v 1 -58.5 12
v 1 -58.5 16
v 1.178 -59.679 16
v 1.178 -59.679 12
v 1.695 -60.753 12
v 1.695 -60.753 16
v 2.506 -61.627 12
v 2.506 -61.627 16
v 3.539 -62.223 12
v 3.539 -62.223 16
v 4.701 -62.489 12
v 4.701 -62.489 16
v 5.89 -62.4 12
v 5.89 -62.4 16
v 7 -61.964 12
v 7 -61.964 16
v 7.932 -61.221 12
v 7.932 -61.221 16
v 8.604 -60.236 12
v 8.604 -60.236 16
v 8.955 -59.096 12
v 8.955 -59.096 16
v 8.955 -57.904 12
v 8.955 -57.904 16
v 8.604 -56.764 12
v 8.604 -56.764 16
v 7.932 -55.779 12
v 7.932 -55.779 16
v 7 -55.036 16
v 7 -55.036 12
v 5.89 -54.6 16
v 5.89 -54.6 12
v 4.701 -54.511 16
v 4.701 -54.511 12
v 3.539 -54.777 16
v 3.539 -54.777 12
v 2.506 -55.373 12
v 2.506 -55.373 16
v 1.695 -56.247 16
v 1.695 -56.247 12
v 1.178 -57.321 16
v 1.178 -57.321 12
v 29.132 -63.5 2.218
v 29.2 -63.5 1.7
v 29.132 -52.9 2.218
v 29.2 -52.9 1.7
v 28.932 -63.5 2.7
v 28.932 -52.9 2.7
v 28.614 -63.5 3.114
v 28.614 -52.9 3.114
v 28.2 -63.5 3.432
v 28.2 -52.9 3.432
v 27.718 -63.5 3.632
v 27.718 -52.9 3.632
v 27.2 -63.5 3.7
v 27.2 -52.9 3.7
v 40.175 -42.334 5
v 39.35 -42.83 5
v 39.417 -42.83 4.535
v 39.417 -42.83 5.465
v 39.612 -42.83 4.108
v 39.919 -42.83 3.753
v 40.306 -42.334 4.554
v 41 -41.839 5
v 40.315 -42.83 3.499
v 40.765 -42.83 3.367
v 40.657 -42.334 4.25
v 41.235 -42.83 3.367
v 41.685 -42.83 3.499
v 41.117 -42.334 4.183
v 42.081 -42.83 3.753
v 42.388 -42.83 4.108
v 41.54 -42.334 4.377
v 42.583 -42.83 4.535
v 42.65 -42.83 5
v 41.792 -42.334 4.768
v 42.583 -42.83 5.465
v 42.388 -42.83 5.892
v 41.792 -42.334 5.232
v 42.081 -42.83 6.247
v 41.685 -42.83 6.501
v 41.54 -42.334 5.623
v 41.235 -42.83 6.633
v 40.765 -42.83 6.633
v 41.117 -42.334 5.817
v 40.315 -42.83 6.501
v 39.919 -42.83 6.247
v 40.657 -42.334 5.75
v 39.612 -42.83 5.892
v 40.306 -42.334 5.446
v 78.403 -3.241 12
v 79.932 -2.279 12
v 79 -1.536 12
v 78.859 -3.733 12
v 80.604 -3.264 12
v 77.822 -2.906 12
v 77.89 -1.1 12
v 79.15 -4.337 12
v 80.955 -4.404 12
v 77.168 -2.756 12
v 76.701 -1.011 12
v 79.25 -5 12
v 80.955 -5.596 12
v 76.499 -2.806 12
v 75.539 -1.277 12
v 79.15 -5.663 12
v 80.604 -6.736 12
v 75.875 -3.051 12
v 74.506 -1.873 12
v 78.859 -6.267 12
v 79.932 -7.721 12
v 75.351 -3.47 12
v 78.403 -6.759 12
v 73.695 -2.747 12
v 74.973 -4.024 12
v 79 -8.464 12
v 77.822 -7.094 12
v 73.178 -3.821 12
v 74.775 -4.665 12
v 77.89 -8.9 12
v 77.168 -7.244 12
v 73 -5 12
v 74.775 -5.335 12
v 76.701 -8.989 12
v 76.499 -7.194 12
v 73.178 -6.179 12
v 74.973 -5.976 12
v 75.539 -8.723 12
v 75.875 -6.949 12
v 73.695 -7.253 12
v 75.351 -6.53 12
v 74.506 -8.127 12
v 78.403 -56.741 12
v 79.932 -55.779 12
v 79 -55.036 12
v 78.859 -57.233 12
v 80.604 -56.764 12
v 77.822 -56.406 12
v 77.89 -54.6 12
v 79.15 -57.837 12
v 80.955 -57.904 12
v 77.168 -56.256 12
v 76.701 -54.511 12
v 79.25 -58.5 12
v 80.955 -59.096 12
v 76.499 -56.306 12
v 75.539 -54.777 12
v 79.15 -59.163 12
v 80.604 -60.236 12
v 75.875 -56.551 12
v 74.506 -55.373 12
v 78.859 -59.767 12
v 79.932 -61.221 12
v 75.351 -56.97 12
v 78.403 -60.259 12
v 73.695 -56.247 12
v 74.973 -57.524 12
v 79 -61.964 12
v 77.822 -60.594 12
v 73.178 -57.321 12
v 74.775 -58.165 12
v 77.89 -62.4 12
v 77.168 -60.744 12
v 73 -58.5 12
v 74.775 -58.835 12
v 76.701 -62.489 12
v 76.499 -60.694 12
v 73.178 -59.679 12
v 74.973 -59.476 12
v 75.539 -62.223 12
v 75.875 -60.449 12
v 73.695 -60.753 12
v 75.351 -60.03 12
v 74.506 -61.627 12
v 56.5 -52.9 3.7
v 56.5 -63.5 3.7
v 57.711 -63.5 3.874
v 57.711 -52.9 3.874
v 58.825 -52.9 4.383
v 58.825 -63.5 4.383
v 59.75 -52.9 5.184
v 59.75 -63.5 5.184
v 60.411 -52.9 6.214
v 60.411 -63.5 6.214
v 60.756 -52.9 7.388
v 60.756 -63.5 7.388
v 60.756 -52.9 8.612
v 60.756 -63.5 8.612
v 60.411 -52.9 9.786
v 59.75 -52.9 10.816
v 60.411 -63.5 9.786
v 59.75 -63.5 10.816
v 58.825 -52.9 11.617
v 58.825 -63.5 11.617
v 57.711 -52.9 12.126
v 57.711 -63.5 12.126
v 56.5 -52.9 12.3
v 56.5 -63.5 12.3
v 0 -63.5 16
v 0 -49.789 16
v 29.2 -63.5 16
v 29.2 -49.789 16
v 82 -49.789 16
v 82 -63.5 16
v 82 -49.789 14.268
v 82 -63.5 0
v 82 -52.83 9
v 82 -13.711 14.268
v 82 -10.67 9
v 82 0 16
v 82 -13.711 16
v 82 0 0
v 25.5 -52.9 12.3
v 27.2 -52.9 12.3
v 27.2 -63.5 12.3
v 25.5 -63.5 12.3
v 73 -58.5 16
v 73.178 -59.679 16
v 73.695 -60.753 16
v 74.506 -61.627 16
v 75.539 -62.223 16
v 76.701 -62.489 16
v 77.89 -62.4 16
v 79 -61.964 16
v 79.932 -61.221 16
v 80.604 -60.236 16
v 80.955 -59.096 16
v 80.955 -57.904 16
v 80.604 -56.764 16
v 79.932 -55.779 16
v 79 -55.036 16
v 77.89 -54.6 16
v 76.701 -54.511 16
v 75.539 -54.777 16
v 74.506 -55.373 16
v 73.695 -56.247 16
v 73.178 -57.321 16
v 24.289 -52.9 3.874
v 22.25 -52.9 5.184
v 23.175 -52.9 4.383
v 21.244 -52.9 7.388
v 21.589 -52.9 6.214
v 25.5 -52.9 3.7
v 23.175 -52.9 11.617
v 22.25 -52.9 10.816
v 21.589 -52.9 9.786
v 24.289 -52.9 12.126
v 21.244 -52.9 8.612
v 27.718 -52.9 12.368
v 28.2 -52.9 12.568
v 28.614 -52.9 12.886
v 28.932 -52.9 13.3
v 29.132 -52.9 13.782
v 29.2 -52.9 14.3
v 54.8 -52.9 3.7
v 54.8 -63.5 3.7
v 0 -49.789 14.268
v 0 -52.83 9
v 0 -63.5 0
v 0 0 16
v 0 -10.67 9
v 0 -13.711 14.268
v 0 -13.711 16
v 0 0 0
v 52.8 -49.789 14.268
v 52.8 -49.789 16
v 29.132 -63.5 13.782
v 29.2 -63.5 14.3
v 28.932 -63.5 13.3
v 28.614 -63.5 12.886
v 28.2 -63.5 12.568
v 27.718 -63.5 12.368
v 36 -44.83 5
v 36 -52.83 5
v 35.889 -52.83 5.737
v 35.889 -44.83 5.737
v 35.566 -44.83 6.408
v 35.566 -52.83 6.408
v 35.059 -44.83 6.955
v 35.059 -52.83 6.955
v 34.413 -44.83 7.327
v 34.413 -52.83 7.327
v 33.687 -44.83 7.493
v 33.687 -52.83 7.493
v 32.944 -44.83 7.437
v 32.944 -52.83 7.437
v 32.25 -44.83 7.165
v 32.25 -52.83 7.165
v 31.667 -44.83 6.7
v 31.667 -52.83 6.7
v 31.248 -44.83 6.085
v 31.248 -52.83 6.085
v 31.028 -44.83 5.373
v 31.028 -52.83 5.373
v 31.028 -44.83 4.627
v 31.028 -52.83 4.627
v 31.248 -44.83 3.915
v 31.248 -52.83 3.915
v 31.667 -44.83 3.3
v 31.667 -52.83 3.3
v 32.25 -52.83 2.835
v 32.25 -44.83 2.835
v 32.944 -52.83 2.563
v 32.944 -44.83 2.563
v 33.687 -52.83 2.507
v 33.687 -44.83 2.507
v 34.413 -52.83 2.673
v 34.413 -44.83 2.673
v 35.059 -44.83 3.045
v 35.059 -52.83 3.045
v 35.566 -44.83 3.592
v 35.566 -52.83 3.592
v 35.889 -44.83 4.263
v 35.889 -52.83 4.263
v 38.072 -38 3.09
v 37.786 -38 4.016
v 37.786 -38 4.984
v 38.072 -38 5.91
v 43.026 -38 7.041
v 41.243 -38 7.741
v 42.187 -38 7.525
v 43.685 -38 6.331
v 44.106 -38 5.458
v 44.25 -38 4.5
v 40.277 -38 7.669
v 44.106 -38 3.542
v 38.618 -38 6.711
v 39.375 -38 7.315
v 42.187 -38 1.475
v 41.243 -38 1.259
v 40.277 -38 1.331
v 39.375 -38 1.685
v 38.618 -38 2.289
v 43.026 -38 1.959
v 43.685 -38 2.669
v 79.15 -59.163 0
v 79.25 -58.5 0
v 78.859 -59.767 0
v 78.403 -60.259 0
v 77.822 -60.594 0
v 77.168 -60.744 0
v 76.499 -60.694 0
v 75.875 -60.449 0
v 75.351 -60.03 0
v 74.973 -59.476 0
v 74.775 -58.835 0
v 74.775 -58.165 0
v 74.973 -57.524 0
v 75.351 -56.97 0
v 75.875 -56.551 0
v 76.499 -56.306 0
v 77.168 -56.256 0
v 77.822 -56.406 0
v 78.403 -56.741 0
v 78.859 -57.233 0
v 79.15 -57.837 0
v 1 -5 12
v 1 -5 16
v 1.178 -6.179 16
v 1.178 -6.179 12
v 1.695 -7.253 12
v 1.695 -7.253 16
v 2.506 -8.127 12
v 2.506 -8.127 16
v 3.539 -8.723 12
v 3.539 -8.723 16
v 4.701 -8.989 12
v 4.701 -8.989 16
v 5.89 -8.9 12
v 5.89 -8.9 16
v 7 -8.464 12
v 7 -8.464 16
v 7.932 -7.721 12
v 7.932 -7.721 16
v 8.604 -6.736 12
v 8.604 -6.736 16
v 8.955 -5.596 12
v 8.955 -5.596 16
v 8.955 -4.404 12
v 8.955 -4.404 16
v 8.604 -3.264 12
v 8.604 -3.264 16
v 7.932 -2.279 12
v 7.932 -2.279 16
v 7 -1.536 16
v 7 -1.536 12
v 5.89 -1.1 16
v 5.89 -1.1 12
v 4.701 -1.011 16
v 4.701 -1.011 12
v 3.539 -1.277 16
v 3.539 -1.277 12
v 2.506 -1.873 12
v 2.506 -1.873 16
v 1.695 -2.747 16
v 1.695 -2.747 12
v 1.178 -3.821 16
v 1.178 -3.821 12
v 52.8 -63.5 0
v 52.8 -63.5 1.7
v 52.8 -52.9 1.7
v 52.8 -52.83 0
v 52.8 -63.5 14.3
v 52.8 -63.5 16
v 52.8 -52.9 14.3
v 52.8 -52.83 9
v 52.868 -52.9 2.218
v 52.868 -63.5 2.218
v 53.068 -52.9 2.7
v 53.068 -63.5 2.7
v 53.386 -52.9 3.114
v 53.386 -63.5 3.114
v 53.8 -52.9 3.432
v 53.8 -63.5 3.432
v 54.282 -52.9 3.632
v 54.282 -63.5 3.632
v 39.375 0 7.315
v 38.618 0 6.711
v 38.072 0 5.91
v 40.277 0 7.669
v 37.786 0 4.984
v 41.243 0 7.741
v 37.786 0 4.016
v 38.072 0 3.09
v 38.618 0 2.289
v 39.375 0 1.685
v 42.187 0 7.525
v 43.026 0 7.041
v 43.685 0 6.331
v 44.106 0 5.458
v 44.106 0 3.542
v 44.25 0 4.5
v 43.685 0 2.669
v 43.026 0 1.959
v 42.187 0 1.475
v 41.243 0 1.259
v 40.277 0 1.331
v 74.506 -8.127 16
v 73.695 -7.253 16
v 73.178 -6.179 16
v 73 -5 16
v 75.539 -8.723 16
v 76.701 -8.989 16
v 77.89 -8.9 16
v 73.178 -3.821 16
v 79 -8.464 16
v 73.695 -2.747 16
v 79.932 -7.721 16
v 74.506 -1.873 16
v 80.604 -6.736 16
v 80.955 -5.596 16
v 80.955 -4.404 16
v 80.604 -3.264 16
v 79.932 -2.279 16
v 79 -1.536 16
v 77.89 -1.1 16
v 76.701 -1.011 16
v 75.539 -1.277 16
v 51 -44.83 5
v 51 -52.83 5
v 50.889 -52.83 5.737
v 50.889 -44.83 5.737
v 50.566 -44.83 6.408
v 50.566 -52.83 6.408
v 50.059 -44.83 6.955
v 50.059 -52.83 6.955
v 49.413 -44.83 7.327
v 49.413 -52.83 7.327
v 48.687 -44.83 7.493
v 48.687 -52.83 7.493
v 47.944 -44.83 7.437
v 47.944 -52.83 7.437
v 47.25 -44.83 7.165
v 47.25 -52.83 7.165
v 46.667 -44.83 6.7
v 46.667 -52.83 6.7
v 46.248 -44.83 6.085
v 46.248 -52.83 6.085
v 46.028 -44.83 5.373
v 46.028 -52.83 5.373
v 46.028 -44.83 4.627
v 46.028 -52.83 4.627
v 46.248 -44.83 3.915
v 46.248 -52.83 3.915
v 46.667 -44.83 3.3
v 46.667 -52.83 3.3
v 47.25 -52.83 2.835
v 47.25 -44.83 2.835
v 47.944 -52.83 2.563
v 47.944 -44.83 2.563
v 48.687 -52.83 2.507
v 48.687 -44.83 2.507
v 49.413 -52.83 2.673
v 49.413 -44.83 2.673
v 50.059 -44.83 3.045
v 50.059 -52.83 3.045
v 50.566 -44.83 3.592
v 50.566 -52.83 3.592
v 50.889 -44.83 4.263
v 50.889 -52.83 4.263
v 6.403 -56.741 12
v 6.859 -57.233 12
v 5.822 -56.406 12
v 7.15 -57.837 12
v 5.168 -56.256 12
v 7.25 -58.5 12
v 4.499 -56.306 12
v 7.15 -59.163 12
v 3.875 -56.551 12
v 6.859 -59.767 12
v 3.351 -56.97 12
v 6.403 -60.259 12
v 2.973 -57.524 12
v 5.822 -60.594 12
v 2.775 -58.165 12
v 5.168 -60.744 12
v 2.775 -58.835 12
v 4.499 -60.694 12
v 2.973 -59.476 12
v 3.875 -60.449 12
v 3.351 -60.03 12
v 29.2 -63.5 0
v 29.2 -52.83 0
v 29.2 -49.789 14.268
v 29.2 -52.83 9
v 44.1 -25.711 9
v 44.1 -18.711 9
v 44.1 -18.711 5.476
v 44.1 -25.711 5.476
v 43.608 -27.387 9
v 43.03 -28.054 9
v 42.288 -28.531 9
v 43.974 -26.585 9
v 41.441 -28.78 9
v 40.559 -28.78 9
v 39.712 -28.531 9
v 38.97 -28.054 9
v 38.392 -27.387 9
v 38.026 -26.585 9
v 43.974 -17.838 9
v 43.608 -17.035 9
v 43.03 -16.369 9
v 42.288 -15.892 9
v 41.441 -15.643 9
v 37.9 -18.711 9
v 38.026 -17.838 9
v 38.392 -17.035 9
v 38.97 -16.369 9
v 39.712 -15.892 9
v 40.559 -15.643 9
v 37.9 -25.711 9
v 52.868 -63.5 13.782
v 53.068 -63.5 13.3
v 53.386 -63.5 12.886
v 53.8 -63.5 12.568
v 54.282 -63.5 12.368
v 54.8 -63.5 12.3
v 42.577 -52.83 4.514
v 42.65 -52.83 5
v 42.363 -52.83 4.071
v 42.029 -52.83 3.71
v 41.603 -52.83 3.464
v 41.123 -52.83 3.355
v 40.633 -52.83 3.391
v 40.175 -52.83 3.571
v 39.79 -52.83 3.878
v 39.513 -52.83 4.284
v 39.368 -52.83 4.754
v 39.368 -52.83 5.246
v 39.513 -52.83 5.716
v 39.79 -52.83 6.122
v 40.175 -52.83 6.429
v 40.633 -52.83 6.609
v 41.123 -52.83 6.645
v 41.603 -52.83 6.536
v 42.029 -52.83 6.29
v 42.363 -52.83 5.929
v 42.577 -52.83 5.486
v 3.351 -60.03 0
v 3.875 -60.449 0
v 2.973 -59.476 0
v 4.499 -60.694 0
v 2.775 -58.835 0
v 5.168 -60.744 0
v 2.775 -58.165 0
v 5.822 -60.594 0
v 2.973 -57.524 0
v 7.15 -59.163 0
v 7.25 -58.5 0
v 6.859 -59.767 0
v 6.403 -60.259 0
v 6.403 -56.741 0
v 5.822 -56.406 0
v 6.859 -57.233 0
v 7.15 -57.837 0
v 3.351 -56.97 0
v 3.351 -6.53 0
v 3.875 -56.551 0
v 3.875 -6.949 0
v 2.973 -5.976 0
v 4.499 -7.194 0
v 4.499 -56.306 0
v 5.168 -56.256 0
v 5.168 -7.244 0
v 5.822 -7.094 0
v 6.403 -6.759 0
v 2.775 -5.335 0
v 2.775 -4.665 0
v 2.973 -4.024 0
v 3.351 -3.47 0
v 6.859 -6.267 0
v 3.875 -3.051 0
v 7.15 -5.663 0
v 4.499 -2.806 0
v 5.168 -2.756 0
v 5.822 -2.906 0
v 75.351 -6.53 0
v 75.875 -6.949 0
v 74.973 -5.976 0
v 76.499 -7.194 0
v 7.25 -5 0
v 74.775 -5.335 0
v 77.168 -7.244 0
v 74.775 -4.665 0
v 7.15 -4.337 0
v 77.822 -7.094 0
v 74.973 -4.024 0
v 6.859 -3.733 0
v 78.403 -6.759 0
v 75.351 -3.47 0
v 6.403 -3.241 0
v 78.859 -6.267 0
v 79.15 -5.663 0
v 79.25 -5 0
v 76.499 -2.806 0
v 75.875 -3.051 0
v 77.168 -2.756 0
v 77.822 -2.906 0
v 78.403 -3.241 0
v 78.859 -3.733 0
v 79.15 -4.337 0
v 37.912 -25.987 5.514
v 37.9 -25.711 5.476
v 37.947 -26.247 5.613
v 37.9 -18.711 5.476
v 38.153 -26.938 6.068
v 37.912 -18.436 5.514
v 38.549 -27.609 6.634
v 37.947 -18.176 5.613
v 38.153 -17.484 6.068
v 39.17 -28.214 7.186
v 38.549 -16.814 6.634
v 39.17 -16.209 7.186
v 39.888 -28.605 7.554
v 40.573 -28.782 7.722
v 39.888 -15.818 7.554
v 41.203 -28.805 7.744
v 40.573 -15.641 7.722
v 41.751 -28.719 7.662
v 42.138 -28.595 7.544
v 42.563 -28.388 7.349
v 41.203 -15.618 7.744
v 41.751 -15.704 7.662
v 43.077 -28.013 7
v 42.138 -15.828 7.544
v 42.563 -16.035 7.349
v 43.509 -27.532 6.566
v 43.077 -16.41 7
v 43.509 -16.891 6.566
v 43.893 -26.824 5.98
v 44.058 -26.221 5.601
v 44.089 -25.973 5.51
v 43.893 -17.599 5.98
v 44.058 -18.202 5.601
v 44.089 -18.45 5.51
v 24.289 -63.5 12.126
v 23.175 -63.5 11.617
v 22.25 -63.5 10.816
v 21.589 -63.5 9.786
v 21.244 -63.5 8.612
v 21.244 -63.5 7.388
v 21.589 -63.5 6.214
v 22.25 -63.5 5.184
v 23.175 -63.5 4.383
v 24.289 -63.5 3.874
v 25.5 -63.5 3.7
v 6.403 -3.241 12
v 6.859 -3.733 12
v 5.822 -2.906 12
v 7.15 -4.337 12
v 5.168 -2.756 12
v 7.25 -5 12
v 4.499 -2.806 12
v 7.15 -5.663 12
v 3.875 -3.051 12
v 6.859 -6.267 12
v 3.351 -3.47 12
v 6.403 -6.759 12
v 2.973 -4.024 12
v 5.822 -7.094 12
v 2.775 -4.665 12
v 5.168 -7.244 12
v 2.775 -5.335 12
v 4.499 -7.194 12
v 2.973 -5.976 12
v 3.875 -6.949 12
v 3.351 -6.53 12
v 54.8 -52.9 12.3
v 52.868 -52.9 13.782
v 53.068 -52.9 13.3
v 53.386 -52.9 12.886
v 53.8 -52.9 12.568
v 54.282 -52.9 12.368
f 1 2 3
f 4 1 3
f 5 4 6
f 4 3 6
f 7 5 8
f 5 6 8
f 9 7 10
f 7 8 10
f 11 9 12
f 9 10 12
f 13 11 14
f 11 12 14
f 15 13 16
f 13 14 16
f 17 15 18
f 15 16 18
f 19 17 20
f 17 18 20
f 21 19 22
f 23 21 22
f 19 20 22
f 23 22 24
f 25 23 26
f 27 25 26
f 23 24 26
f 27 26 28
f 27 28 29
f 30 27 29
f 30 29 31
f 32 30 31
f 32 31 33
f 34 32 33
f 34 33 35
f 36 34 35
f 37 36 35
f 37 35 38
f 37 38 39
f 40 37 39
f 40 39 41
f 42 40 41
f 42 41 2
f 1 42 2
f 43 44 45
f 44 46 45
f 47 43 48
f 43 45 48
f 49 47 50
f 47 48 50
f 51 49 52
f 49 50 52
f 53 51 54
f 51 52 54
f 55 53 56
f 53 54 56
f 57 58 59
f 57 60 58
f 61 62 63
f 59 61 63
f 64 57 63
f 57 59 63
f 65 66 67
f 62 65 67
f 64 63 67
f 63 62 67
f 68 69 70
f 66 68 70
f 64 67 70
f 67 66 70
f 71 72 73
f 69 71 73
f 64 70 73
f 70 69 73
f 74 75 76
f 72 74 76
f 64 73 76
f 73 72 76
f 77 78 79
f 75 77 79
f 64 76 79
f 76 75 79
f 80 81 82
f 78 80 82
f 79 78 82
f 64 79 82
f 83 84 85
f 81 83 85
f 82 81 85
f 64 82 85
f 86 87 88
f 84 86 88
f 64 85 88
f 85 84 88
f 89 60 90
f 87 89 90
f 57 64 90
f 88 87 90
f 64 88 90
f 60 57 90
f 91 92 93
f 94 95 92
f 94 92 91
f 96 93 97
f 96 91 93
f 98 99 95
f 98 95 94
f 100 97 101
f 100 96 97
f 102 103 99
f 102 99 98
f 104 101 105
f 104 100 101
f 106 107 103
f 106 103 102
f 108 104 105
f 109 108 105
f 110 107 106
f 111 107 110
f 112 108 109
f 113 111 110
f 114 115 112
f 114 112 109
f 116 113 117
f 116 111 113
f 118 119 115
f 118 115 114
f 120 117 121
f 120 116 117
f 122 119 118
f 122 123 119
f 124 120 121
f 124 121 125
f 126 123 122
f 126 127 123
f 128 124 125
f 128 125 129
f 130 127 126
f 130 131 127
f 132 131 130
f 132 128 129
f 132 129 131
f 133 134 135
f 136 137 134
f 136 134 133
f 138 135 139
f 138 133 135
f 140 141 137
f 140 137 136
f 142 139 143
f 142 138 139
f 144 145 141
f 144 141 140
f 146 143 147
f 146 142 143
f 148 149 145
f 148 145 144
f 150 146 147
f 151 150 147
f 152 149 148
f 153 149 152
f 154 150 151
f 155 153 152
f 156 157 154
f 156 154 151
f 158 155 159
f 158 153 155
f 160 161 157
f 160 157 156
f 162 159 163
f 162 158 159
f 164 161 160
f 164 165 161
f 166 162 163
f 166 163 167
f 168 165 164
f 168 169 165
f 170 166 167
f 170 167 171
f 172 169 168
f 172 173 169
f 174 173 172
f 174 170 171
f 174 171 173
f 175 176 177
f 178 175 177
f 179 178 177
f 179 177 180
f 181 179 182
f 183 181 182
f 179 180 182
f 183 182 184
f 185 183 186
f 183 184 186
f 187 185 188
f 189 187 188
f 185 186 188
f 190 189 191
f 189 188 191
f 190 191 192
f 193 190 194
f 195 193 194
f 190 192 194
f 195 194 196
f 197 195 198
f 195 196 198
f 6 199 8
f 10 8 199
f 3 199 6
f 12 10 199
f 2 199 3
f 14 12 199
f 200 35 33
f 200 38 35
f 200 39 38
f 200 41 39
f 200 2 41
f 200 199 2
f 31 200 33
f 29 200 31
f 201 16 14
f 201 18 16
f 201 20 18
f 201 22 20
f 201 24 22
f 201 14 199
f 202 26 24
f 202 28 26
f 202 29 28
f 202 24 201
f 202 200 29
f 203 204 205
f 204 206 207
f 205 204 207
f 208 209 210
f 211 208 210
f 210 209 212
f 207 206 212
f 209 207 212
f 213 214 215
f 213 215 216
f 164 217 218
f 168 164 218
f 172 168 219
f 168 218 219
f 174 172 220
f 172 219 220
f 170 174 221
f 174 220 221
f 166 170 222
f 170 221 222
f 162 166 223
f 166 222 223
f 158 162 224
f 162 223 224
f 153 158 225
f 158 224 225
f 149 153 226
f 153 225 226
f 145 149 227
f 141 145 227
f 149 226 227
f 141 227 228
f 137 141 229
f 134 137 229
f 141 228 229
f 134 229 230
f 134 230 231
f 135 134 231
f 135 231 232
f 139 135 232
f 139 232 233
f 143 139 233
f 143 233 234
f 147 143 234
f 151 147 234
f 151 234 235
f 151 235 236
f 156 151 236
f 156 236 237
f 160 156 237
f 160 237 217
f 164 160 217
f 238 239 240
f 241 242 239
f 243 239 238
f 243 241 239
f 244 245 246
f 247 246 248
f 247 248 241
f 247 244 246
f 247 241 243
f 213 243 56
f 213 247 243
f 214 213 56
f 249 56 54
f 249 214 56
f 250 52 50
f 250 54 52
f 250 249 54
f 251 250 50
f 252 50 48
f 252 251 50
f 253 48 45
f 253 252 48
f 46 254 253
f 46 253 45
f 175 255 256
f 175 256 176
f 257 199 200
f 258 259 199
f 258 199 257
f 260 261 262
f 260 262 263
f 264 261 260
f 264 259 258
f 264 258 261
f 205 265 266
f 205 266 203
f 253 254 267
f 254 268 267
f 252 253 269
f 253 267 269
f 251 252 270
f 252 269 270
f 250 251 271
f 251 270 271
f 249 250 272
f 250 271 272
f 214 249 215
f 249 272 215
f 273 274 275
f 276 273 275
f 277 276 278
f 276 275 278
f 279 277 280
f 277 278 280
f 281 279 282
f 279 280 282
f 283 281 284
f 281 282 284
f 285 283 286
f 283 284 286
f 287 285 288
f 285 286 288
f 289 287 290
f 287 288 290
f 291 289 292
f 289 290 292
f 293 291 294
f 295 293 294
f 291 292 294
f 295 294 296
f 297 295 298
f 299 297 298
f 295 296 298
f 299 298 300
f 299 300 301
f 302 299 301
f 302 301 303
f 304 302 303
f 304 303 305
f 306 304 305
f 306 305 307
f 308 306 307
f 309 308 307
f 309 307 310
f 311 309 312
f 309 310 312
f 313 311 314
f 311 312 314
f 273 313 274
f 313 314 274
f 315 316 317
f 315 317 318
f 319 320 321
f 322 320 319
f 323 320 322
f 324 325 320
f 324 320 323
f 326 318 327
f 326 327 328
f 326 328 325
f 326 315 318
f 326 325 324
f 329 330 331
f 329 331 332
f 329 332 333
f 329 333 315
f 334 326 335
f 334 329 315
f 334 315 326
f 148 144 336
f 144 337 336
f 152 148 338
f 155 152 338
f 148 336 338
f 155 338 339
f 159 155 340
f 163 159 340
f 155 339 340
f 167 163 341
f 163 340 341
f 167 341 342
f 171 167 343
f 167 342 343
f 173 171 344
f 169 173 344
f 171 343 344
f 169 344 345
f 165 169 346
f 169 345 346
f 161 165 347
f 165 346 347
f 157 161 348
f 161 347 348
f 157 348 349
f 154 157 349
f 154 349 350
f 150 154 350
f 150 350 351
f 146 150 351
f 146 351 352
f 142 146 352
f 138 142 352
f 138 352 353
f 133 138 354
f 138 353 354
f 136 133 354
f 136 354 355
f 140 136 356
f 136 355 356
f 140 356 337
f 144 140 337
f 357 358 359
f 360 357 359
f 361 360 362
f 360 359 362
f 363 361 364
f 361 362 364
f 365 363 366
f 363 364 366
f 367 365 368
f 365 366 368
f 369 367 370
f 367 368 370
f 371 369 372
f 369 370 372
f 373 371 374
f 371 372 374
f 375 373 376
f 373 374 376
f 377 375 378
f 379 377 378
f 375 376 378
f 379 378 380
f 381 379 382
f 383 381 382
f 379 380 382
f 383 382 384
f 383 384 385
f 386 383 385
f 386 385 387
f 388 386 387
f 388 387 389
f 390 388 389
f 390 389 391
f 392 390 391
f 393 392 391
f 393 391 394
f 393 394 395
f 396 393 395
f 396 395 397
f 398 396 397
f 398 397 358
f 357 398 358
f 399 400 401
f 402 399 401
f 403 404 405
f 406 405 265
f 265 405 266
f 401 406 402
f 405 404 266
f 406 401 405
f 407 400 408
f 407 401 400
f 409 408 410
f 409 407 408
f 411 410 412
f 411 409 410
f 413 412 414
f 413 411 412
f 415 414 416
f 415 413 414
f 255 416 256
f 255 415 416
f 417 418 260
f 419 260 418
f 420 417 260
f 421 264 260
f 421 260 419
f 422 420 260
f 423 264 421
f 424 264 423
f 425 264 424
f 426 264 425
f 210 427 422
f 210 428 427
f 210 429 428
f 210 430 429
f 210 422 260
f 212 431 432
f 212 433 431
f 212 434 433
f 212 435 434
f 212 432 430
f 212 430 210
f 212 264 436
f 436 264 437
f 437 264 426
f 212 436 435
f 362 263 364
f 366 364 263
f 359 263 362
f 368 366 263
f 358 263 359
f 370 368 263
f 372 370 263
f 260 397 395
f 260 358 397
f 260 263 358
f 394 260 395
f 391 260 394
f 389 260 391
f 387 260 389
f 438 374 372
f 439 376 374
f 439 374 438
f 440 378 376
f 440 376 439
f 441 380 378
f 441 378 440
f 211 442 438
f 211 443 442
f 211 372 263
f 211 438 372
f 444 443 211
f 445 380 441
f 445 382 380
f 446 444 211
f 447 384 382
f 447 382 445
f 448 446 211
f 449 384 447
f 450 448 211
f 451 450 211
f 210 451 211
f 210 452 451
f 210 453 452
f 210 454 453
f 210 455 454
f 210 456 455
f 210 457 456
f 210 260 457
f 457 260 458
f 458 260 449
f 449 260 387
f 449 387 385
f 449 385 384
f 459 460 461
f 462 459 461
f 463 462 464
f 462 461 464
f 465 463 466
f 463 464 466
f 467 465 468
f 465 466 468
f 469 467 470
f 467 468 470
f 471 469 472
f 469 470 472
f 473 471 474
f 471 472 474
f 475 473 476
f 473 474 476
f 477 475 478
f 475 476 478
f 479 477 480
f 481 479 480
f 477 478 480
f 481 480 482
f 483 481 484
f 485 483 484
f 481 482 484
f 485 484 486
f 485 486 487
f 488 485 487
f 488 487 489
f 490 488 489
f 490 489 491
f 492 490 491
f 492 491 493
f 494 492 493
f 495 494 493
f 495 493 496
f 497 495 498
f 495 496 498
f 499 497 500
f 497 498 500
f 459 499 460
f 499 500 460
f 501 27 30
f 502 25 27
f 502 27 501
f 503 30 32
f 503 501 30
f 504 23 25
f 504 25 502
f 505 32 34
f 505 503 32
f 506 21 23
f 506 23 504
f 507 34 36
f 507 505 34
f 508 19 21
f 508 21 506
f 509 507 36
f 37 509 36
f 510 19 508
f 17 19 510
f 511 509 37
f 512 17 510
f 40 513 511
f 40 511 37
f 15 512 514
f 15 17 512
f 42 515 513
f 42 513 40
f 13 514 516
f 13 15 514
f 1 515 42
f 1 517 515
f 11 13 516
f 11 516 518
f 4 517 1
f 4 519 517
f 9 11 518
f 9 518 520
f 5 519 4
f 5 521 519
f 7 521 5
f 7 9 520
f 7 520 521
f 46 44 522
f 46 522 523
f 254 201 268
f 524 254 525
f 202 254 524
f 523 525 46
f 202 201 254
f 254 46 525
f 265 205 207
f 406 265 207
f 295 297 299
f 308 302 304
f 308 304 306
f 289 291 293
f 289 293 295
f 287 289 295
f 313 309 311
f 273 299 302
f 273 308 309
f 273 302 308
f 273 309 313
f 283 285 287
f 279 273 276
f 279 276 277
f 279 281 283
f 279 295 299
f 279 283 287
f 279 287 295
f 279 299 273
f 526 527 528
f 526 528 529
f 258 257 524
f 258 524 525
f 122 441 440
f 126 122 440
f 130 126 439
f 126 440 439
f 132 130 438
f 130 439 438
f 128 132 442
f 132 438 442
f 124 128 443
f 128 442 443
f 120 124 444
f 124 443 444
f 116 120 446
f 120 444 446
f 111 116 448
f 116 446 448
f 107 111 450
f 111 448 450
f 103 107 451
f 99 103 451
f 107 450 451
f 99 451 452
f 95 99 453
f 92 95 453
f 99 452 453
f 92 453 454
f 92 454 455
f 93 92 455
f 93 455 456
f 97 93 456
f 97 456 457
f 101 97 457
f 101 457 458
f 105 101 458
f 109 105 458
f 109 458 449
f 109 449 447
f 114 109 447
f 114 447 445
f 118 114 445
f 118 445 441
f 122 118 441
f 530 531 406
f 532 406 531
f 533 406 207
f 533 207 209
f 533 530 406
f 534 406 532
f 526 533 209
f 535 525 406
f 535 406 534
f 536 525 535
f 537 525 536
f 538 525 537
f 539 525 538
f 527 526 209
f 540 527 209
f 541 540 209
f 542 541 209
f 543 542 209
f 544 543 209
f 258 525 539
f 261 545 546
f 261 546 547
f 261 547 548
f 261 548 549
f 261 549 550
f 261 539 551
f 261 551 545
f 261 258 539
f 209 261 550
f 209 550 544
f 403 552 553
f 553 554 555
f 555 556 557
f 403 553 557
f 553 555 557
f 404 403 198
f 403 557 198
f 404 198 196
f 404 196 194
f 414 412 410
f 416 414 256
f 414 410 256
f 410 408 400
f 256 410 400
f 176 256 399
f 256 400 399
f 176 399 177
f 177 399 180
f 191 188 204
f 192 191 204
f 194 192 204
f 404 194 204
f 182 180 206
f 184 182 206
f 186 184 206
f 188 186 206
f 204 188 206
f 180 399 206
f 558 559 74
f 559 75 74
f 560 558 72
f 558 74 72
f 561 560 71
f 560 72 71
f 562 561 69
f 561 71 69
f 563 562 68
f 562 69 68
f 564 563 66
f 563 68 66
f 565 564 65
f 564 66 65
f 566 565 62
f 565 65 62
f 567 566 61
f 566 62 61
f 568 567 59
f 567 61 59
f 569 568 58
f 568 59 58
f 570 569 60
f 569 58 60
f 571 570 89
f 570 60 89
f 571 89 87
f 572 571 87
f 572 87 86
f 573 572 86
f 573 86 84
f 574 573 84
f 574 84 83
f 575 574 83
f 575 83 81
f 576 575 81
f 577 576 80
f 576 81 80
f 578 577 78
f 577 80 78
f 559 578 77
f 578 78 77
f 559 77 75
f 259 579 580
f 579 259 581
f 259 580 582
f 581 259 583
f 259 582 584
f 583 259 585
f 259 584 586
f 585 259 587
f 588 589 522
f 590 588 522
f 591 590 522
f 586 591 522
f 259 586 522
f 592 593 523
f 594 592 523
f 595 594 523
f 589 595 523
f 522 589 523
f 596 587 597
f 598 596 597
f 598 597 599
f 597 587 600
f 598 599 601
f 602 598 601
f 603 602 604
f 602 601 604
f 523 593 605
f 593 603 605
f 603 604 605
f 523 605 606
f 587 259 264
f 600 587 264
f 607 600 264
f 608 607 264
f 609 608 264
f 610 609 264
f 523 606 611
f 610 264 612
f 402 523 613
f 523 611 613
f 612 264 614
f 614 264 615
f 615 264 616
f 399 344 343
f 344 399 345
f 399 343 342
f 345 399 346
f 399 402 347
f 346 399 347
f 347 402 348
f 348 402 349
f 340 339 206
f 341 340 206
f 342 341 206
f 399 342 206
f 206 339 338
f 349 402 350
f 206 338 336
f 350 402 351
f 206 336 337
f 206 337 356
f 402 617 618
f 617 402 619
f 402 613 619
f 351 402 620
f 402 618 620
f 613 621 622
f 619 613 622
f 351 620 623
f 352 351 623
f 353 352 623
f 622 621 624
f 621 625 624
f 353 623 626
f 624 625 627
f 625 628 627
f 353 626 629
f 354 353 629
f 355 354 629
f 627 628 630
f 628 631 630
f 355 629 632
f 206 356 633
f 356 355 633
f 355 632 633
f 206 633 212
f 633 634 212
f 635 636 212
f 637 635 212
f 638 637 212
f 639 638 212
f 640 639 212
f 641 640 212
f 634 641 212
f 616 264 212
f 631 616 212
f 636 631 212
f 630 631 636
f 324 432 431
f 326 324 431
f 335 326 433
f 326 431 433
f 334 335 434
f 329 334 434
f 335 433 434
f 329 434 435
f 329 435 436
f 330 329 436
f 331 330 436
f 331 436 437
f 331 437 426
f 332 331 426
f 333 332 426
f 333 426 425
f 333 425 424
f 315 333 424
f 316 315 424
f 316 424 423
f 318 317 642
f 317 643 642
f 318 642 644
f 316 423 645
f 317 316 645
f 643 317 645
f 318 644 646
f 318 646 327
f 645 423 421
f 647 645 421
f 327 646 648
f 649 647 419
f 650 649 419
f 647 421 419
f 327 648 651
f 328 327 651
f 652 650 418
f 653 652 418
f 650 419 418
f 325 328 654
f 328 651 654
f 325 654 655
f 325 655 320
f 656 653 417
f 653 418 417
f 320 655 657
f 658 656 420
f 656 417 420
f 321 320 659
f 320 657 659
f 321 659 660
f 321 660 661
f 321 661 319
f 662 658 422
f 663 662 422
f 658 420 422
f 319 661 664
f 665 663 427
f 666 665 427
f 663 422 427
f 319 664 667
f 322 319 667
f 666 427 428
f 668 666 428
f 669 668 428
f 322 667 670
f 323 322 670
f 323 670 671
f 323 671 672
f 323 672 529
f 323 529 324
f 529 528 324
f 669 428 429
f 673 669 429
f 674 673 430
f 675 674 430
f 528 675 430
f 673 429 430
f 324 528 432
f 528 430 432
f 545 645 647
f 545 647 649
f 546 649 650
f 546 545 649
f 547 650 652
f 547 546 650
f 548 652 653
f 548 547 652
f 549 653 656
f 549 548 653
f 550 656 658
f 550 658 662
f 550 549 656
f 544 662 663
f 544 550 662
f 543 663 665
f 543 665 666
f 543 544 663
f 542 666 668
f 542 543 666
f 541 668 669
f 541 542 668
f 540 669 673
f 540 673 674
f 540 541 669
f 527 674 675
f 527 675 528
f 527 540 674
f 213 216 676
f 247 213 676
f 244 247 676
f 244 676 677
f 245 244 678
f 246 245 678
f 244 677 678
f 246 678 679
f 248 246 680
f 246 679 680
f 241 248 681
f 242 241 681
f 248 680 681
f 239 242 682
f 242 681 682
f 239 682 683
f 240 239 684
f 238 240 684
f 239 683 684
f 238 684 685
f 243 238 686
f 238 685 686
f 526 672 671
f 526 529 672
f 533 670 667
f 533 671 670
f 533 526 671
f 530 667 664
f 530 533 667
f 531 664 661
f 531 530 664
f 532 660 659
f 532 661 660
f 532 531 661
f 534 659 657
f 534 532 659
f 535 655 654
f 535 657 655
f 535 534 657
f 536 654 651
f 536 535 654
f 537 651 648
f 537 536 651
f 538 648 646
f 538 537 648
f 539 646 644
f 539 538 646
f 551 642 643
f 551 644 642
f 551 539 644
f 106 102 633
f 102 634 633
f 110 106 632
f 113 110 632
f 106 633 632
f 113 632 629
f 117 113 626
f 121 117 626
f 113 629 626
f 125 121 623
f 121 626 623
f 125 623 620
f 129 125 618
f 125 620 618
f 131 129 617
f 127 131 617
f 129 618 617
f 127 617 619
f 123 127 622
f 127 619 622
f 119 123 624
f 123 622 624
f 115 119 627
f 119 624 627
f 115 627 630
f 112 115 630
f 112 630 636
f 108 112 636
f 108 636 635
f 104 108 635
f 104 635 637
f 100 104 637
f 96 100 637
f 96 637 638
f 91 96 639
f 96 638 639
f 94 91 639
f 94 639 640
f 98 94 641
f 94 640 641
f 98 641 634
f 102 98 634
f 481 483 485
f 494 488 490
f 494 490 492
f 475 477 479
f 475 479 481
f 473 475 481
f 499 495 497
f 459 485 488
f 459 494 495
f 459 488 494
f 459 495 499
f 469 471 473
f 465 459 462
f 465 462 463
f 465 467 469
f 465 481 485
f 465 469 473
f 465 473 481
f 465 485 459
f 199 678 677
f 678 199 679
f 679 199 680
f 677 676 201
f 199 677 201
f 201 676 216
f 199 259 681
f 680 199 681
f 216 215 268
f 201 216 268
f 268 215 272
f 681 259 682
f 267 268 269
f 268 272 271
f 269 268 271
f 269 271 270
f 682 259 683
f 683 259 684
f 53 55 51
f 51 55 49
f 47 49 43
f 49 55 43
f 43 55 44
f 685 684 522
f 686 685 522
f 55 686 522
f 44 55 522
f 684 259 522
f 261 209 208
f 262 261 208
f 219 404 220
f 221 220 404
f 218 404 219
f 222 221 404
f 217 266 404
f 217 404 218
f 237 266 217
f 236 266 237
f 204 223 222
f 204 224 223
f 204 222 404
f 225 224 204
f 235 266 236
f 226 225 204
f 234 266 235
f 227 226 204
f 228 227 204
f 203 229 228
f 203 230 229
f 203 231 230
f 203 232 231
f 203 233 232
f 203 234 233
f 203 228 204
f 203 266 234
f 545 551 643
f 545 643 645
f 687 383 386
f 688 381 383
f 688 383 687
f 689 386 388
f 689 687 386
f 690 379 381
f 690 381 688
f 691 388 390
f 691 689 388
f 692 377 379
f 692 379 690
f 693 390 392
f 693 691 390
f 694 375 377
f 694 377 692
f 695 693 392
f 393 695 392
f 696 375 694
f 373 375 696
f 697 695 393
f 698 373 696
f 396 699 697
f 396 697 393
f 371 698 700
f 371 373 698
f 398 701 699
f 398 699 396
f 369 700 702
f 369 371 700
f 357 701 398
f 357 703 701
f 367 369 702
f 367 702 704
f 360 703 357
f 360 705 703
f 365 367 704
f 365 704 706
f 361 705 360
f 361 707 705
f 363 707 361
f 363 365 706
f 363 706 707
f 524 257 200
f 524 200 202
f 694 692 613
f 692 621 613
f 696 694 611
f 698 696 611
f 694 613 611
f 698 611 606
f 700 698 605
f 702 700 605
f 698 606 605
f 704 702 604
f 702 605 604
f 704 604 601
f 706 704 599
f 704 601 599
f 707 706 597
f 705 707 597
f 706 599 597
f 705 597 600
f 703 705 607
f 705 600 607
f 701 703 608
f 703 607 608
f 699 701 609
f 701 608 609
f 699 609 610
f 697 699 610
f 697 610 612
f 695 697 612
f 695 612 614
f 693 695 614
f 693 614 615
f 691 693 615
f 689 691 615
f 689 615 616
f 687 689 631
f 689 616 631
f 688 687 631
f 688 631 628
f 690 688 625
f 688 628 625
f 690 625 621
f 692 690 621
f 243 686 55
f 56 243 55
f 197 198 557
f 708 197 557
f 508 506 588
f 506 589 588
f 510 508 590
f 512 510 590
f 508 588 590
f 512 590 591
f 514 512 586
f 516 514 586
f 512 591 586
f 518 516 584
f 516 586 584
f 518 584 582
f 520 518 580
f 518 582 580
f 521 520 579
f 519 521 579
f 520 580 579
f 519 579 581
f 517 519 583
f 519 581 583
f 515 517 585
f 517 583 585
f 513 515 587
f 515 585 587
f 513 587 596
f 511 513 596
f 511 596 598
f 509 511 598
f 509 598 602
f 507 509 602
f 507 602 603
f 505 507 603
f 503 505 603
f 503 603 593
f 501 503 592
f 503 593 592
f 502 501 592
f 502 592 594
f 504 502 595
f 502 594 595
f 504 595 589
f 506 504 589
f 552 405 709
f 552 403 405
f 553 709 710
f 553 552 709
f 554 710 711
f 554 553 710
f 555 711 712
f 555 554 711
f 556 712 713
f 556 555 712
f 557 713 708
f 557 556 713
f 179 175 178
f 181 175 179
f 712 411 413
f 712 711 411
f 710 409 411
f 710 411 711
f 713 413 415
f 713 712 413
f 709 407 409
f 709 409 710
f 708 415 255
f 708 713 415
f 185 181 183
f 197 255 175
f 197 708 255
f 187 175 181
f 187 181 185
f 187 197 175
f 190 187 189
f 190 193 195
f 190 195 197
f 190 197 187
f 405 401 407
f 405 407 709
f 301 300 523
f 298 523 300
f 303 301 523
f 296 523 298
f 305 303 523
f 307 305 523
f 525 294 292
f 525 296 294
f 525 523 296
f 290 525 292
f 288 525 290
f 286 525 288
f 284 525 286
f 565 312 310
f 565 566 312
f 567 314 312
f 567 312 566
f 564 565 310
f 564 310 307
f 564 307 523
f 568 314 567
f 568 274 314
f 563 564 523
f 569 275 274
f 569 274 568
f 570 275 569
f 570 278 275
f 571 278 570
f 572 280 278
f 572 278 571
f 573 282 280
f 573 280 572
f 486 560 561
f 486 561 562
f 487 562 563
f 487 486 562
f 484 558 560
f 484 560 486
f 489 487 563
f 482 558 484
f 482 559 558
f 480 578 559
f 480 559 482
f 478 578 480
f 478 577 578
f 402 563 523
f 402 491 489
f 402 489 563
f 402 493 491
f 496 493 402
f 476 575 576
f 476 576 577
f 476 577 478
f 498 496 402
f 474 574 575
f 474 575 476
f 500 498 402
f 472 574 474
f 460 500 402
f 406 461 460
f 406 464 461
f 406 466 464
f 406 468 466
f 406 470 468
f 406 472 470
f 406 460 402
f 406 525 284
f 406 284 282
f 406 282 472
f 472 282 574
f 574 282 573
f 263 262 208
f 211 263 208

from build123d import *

# Parameters (mm, degrees)
SKETCH_1_W                  = 82
SKETCH_1_H                  = 63.5
EXTRUDE_1_DEPTH             = 16
CUT_EXTRUDE_1_DEPTH         = 83
SKETCH_15_W                 = 23.6
SKETCH_15_H                 = 14.711451884
CUT_EXTRUDE_4_DEPTH         = 7
SKETCH_16_W                 = 23.6
SKETCH_16_H                 = 10.67
CUT_EXTRUDE_5_DEPTH         = 9
SKETCH_17_R                 = 2.5
CUT_EXTRUDE_6_DEPTH         = 8
M4X0_72_D                   = 3.3
M4X0_72_DEPTH               = 10
M4X0_72_TIP                 = 0.991420021
CUT_EXTRUDE_7_DEPTH         = 4
SKETCH_26_R                 = 3.25
CUT_EXTRUDE_8_DEPTH         = 38
HOLE_WIZARD_M41_D           = 4.5
HOLE_WIZARD_M41_CBORE_D     = 8
HOLE_WIZARD_M41_CBORE_DEPTH = 4
CHAMFER_2_SIZE              = 1
CHAMFER_2_SIZE2             = 2
CHAMFER_2_PART_2_SIZE       = 1
CHAMFER_2_PART_2_SIZE2      = 2
CHAMFER_2_PART_3_SIZE       = 1
CHAMFER_2_PART_3_SIZE2      = 2
CUT_EXTRUDE_12_DEPTH        = 10.6
FILLET_1_R                  = 2


with BuildPart() as part:
    # Эскиз1 → Бобышка-Вытянуть1 (new body)
    with BuildSketch(Plane.XY):
        with Locations((41, -31.75)):
            Rectangle(SKETCH_1_W, SKETCH_1_H)
    extrude(amount=EXTRUDE_1_DEPTH)

    # Эскиз2 → Вырез-Вытянуть1 (cut, through all)
    with BuildSketch(Plane.ZY):
        Polygon((9, -10.67), (16, -14.711451884), (16, -48.788548116), (9, -52.83), align=None)
    extrude(amount=-CUT_EXTRUDE_1_DEPTH, mode=Mode.SUBTRACT)

    # Эскиз15 → Вырез-Вытянуть4 (cut)
    with BuildSketch(Plane.XY.offset(16)):
        with Locations((41, -56.144274058)):
            Rectangle(SKETCH_15_W, SKETCH_15_H)
    extrude(amount=-CUT_EXTRUDE_4_DEPTH, mode=Mode.SUBTRACT)

    # Эскиз16 → Вырез-Вытянуть5 (cut)
    with BuildSketch(Plane.XY.offset(9)):
        with Locations((41, -58.165)):
            Rectangle(SKETCH_16_W, SKETCH_16_H)
    extrude(amount=-CUT_EXTRUDE_5_DEPTH, mode=Mode.SUBTRACT)

    # Эскиз17 → Вырез-Вытянуть6 (cut)
    with BuildSketch(Plane.XZ.offset(52.83)):
        with Locations((33.5, 5)):
            Circle(SKETCH_17_R)
        with Locations((48.5, 5)):
            Circle(SKETCH_17_R)
    extrude(amount=-CUT_EXTRUDE_6_DEPTH, mode=Mode.SUBTRACT)

    # Отверстие обработанное метчиком M4x0.72
    with Locations(Plane(origin=(0, -52.83, 0), x_dir=(-1, 0, 0), z_dir=(0, -1, 0))):
        with Locations((-41, -5)):
            Hole(M4X0_72_D / 2, depth=M4X0_72_DEPTH)
            with Locations((0, 0, -(M4X0_72_DEPTH + M4X0_72_TIP / 2))):  # 118° drill point
                Cone(0, M4X0_72_D / 2, M4X0_72_TIP, mode=Mode.SUBTRACT)

    # Эскиз25 → Вырез-Вытянуть7 (cut)
    with BuildSketch(Plane.XY.offset(9)):
        with BuildLine():
            Line((44.1, -18.711451884), (44.1, -25.711451884))
            ThreePointArc((44.1, -25.711451884), (41, -28.811451884), (37.9, -25.711451884))
            Line((37.9, -25.711451884), (37.9, -18.711451884))
            ThreePointArc((37.9, -18.711451884), (41, -15.611451884), (44.1, -18.711451884))
        make_face()
    extrude(amount=-CUT_EXTRUDE_7_DEPTH, mode=Mode.SUBTRACT)

    # Эскиз26 → Вырез-Вытянуть8 (cut)
    with BuildSketch(Plane(origin=(0, 0, 0), x_dir=(1, 0, 0), z_dir=(0, 1, 0))):
        with Locations((41, -4.5)):
            Circle(SKETCH_26_R)
    extrude(amount=-CUT_EXTRUDE_8_DEPTH, mode=Mode.SUBTRACT)

    # Цековка для винта с внутренним шестигранником M41 (through all)
    with Locations(Plane(origin=(30.759227947, 26.793365177, 16), x_dir=(-1, 0, 0), z_dir=(0, 0, 1))):
        with Locations((-46.240772053, 31.793365177), (-46.240772053, 85.293365177), (25.759227947, 85.293365177), (25.759227947, 31.793365177)):
            CounterBoreHole(HOLE_WIZARD_M41_D / 2, HOLE_WIZARD_M41_CBORE_D / 2, HOLE_WIZARD_M41_CBORE_DEPTH)

    # Фаска2
    chamfer_2_edges = [part.edges().sort_by_distance(p)[0] for p in [
        (41, -14.711451884, 16),
    ]]
    chamfer_2_side = [part.faces().sort_by_distance(p)[0] for p in [
        (41, -7.569889145, 16),
    ]]
    chamfer(chamfer_2_edges, length=CHAMFER_2_SIZE, length2=CHAMFER_2_SIZE2, reference=chamfer_2_side[0])

    # Фаска2 part 2
    chamfer_2_part_2_edges = [part.edges().sort_by_distance(p)[0] for p in [
        (67.4, -48.788548116, 16),
    ]]
    chamfer_2_part_2_side = [part.faces().sort_by_distance(p)[0] for p in [
        (66.127821531, -55.832096576, 16),
    ]]
    chamfer(chamfer_2_part_2_edges, length=CHAMFER_2_PART_2_SIZE, length2=CHAMFER_2_PART_2_SIZE2, reference=chamfer_2_part_2_side[0])

    # Фаска2 part 3
    chamfer_2_part_3_edges = [part.edges().sort_by_distance(p)[0] for p in [
        (14.6, -48.788548116, 16),
    ]]
    chamfer_2_part_3_side = [part.faces().sort_by_distance(p)[0] for p in [
        (15.872178469, -55.832096576, 16),
    ]]
    chamfer(chamfer_2_part_3_edges, length=CHAMFER_2_PART_3_SIZE, length2=CHAMFER_2_PART_3_SIZE2, reference=chamfer_2_part_3_side[0])

    # Эскиз32 → Вырез-Вытянуть12 (cut)
    with BuildSketch(Plane.XZ.offset(63.5)):
        with BuildLine():
            Line((29.5, 12.3), (25.5, 12.3))
            ThreePointArc((25.5, 12.3), (21.2, 8), (25.5, 3.7))
            Line((25.5, 3.7), (29.5, 3.7))
            Line((29.5, 3.7), (29.5, 12.3))
        make_face()
        with BuildLine():
            Line((52.5, 3.7), (56.5, 3.7))
            ThreePointArc((56.5, 3.7), (60.8, 8), (56.5, 12.3))
            Line((56.5, 12.3), (52.5, 12.3))
            Line((52.5, 12.3), (52.5, 3.7))
        make_face()
    extrude(amount=-CUT_EXTRUDE_12_DEPTH, mode=Mode.SUBTRACT)

    # Скругление1
    fillet_1_edges = [part.edges().sort_by_distance(p)[0] for p in [
        (29.2, -58.2, 12.3),
        (29.2, -58.2, 3.7),
        (52.8, -58.2, 3.7),
        (52.8, -58.2, 12.3),
    ]]
    fillet(fillet_1_edges, radius=FILLET_1_R)


solid = part.part
